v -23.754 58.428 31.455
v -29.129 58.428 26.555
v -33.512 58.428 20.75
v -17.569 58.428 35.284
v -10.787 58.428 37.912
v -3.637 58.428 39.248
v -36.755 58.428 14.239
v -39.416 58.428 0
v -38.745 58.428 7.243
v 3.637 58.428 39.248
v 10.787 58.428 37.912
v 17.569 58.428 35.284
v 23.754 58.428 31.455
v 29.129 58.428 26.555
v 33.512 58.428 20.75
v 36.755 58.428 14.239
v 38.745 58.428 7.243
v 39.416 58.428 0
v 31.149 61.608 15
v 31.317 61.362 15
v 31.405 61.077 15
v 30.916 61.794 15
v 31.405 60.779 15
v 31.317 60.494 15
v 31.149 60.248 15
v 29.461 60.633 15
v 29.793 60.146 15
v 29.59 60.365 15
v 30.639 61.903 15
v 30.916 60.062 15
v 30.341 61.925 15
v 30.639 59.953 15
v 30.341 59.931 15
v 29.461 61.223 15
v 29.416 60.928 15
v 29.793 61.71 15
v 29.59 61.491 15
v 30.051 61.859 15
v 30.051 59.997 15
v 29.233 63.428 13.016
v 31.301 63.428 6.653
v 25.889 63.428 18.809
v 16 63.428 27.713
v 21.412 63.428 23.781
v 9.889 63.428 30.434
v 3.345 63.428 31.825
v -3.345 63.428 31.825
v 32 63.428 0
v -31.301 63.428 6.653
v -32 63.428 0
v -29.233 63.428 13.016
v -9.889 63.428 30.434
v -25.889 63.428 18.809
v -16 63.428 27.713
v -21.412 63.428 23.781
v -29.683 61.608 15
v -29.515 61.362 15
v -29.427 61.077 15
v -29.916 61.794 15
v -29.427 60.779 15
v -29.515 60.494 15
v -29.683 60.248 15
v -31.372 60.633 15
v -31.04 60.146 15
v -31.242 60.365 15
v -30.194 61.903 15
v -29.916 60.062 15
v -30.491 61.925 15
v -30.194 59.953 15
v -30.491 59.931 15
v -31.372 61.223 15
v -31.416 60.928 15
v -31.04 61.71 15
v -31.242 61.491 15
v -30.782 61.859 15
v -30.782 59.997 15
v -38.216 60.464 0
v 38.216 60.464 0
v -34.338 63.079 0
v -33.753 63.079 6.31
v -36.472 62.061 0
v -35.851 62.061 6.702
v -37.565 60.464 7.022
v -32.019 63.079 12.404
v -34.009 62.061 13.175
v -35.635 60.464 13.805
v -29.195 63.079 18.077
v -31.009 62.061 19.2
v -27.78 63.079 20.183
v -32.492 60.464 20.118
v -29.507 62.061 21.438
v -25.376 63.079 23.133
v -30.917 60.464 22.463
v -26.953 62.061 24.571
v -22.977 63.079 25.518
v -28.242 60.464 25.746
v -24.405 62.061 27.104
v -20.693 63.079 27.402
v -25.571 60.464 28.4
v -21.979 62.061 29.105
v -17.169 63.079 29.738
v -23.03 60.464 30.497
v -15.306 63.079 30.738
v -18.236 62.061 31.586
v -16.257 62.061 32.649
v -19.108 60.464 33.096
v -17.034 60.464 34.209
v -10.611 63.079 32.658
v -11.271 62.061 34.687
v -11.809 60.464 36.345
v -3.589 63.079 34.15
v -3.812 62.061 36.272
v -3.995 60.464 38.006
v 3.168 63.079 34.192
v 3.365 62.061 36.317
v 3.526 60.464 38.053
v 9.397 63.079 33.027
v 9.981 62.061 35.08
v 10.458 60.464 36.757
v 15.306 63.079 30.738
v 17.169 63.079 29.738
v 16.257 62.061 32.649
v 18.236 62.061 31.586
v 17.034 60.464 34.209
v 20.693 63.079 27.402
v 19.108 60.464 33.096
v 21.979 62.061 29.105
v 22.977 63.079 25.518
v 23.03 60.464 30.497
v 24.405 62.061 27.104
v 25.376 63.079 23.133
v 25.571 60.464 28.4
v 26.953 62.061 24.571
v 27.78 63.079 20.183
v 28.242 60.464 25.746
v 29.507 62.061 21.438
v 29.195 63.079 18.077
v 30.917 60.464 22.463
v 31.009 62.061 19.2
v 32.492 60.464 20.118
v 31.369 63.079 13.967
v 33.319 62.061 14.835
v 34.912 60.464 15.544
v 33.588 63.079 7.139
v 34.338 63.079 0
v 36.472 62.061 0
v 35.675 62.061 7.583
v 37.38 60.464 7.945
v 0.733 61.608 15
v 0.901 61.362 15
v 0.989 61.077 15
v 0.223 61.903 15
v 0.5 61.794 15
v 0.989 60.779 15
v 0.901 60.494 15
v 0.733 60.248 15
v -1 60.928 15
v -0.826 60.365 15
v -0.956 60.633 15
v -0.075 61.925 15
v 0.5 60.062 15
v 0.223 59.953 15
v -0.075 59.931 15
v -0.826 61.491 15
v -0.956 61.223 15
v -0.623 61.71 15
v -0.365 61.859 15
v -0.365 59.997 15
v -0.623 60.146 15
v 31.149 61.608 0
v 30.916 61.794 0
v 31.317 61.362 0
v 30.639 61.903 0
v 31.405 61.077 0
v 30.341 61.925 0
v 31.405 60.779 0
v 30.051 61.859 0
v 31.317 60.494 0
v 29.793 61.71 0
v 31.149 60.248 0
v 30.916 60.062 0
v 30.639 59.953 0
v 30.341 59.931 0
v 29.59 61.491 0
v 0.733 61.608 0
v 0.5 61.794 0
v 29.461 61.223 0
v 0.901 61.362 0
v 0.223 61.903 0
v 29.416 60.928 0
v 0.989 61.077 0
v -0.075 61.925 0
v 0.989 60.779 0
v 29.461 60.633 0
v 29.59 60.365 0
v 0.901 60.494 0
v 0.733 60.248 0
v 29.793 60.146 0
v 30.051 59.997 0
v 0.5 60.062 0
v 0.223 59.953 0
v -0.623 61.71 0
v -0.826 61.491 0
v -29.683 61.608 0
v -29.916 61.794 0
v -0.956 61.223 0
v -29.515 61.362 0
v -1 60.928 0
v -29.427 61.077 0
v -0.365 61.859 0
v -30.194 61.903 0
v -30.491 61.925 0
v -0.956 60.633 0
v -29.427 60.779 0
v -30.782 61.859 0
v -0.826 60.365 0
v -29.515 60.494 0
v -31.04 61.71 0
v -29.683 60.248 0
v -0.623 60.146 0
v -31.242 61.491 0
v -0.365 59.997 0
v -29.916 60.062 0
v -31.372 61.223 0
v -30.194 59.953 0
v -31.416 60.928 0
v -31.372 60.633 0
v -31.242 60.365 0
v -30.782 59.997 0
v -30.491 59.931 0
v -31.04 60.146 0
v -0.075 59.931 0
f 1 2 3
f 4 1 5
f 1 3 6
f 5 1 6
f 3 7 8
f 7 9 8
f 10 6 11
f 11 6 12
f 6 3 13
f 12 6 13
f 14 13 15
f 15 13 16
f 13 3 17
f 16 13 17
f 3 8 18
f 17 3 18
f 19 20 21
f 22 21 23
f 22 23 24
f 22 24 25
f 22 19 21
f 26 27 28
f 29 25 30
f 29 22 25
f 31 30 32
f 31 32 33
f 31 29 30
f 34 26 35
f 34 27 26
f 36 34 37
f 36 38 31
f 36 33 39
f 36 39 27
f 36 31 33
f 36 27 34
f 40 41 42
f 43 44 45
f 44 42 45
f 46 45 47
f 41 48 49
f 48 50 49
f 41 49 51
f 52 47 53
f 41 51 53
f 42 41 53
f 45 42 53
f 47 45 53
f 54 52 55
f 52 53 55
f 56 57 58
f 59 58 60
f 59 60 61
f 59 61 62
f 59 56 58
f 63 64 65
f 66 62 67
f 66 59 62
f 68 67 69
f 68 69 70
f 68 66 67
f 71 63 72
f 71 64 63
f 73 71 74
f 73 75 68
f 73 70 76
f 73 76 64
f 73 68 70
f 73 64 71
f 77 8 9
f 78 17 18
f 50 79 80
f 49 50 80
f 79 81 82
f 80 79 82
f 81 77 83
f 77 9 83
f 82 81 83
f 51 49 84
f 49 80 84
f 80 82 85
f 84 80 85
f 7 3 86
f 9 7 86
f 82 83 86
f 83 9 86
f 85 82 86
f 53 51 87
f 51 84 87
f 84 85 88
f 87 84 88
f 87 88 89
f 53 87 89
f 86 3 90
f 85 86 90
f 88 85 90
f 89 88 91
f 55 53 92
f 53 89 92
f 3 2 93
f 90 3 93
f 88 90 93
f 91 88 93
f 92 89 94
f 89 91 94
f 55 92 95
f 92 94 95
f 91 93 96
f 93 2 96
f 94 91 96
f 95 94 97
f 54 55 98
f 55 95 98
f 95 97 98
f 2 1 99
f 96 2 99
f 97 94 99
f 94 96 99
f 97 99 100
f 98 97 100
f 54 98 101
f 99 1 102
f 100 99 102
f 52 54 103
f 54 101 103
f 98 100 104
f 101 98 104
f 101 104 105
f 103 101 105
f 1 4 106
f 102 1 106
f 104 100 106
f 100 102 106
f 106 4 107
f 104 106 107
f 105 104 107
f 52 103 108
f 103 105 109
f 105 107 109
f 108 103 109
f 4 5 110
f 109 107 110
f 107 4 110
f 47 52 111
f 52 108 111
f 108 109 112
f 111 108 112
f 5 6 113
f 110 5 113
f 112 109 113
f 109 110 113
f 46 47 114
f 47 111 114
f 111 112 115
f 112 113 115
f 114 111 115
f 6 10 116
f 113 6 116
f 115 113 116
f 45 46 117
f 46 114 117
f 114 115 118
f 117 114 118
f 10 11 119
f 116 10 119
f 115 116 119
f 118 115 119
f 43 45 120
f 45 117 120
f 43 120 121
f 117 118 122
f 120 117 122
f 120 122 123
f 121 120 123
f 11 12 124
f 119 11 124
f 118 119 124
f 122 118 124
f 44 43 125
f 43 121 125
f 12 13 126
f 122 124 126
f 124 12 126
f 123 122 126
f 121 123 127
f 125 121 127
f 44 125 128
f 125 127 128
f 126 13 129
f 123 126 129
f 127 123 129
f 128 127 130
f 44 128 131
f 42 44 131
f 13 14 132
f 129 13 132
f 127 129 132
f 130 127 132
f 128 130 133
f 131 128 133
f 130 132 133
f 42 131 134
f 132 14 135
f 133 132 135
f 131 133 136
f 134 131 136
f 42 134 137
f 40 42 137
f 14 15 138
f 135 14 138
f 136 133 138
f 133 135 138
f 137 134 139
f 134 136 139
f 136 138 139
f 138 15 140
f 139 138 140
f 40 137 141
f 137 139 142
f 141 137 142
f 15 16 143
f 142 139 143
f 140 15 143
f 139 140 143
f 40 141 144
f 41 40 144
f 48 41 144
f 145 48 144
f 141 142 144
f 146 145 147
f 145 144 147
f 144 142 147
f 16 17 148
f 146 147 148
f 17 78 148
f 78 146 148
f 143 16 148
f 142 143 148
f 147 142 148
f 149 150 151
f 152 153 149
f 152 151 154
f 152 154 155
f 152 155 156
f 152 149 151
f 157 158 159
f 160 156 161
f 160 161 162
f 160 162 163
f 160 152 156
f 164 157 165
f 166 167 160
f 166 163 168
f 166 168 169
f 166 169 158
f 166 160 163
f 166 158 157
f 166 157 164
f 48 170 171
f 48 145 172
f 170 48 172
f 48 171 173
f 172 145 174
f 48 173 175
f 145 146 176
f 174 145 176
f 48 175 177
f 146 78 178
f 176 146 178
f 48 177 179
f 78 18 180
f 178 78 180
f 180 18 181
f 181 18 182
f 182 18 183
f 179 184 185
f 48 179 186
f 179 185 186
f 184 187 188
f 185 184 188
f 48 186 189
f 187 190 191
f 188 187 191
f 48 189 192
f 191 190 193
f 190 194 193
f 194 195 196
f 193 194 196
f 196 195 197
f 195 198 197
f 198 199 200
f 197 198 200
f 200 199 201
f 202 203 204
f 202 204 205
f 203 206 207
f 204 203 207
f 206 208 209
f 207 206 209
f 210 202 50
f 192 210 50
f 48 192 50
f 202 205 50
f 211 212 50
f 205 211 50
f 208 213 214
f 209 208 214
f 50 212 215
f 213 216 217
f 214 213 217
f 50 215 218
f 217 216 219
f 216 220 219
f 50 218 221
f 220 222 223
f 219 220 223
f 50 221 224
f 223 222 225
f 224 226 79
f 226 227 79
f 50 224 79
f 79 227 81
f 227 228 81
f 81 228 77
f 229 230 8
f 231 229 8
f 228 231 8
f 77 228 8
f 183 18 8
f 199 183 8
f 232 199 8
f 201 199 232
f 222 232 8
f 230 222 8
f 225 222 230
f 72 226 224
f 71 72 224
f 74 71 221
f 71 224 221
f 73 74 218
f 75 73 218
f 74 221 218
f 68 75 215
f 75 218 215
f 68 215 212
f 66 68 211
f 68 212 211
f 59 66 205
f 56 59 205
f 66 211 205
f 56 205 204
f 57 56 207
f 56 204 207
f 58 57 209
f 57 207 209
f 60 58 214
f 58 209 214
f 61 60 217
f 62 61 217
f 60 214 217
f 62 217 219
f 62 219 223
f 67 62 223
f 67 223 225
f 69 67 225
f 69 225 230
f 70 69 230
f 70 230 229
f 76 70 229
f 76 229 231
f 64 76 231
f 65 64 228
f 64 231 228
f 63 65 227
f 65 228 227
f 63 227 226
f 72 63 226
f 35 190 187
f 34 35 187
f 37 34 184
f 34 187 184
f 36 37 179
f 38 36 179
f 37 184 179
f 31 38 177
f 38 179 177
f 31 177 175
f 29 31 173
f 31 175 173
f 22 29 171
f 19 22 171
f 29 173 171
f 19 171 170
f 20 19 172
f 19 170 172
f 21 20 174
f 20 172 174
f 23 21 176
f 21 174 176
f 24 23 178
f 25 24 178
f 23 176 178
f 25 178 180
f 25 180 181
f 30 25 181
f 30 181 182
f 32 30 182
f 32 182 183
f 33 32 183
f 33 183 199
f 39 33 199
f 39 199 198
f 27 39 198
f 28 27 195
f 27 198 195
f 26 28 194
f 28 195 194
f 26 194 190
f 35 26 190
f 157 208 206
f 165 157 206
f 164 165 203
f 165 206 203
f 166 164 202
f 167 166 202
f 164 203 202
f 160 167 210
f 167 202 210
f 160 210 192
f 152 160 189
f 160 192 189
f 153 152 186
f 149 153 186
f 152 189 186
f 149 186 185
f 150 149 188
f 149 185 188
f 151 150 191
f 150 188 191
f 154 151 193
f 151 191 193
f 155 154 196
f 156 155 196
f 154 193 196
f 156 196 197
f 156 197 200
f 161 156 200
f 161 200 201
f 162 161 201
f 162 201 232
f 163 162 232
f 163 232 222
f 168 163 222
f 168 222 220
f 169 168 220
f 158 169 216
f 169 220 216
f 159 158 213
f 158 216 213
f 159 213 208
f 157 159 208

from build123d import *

# Parameters (mm, degrees)
CUT_EXTRUDE3_DEPTH           = 60
CUT_EXTRUDE5_DEPTH           = 2
CUT_EXTRUDE5_DEPTH_BACK      = 30
SKETCH9_R                    = 38
SKETCH9_R_2                  = 23
SKETCH19_W                   = 12
SKETCH19_H                   = 36.5
CUT_REVOLVE2_ANGLE           = 65
CUT_REVOLVE2_OTHER_WAY_ANGLE = 65
SKETCH21_W                   = 3.25
SKETCH21_H                   = 4
BOSS_EXTRUDE3_DEPTH          = 1.35
CIRPATTERN1_COUNT            = 5
CUT_EXTRUDE9_START           = -5
CUT_EXTRUDE9_DEPTH           = 5
SKETCH23_R                   = 10.5
CUT_EXTRUDE10_DEPTH          = 10
SKETCH24_W                   = 17
SKETCH24_H                   = 12
BOSS_EXTRUDE4_DEPTH          = 8
SKETCH26_W                   = 12
SKETCH26_H                   = 8
CUT_EXTRUDE11_DEPTH          = 10
SKETCH27_W                   = 4
SKETCH27_H                   = 5
CUT_EXTRUDE12_DEPTH          = 5
CUT_EXTRUDE14_DEPTH          = 2
CUT_EXTRUDE14_DEPTH_BACK     = 30
SKETCH29_R                   = 1
CUT_EXTRUDE15_DEPTH          = 15
FILLET1_R                    = 6
FILLET2_R                    = 8
INTERSECT2_DEPTH             = 58.427876097


# Read off the part's stored shape, not the designer's step: Cut-Extrude9, Intersect2
with BuildPart() as part:
    # Sketch1 → Revolve1 (revolve)
    with BuildSketch(Plane.XY, mode=Mode.PRIVATE) as revolve1_sk:
        with BuildLine():
            Line((0, 63.427876097), (32, 63.427876097))
            ThreePointArc((32, 63.427876097), (37.656854249, 61.084730346), (40, 55.427876097))
            Line((40, 55.427876097), (40, 28.846818009))
            ThreePointArc((40, 28.846818009), (38.792081772, 24.082439968), (35.460140376, 20.469057744))
            Line((35.460140376, 20.469057744), (28.539859624, 15.958818353))
            ThreePointArc((28.539859624, 15.958818353), (25.207918228, 12.345436129), (24, 7.581058088))
            Line((24, 7.581058088), (24, 3.25))
            Line((24, 3.25), (24.35, 3))
            Line((24.35, 3), (24.35, 0))
            Line((24.35, 0), (22.5, 0))
            Line((22.5, 0), (22.5, 12.5))
            ThreePointArc((22.5, 12.5), (22.353553391, 12.853553391), (22, 13))
            Line((22, 13), (0, 13))
            Line((0, 13), (0, 63.427876097))
        make_face()
    revolve(revolve1_sk.sketch.rotate(Axis((0, 0, 0), (0, 1, 0)), 90), axis=Axis((0, 0, 0), (0, 1, 0)))

    # Sketch11 → Cut-Extrude3 (cut)
    with BuildSketch(Plane(origin=(0, 13, 0), x_dir=(-1, 0, 0), z_dir=(0, -1, 0))):
        with BuildLine():
            Line((-21, 0), (21, 0))
            ThreePointArc((21, 0), (0, 21), (-21, 0))
        make_face()
    extrude(amount=-CUT_EXTRUDE3_DEPTH, mode=Mode.SUBTRACT)

    # Sketch9 → Cut-Extrude5 (cut, two sides: drawn at the far end of the back side and taken through both)
    with BuildSketch(Plane(origin=(0, 55.427876097, 0), x_dir=(1, 0, 0), z_dir=(0, 1, 0)).offset(-CUT_EXTRUDE5_DEPTH_BACK)):
        with Locations(Location((0, 0, 0), (0, 0, 270))):
            Circle(SKETCH9_R)
        with Locations(Location((0, 0, 0), (0, 0, 270))):
            Circle(SKETCH9_R_2, mode=Mode.SUBTRACT)
    extrude(amount=CUT_EXTRUDE5_DEPTH + CUT_EXTRUDE5_DEPTH_BACK, mode=Mode.SUBTRACT)

    # Sketch19 → Cut-Revolve2 (revolve, cut)
    with BuildSketch(Plane(origin=(0, 0, 0), x_dir=(0, 0, -1), z_dir=(1, 0, 0))):
        with Locations((-41.064715832, 37.177876097)):
            Rectangle(SKETCH19_W, SKETCH19_H)
    revolve(axis=Axis((0, 0, 0), (0, 1, 0)), revolution_arc=CUT_REVOLVE2_ANGLE, mode=Mode.SUBTRACT)

    # Sketch19 → Cut-Revolve2 other way (revolve, cut)
    with BuildSketch(Plane(origin=(0, 0, 0), x_dir=(0, 0, -1), z_dir=(1, 0, 0))):
        with Locations((-41.064715832, 37.177876097)):
            Rectangle(SKETCH19_W, SKETCH19_H)
    revolve(axis=Axis((0, 0, 0), (0, -1, 0)), revolution_arc=CUT_REVOLVE2_OTHER_WAY_ANGLE, mode=Mode.SUBTRACT)

    # Sketch21 → Boss-Extrude3 (add)
    with BuildSketch(Plane(origin=(0, 0, 22.5), x_dir=(-1, 0, 0), z_dir=(0, 0, -1))):
        with Locations((0, 2)):
            Rectangle(SKETCH21_W, SKETCH21_H)
    boss_extrude3 = extrude(amount=BOSS_EXTRUDE3_DEPTH)

    # CirPattern1: Boss-Extrude3 ×5 about axis
    cirpattern1_axis = Axis((0, 0, 0), (0, 1, 0))
    for i in range(1, CIRPATTERN1_COUNT):
        add(boss_extrude3.rotate(cirpattern1_axis, i * 360 / CIRPATTERN1_COUNT))

    # Cut-Extrude9 outline → Cut-Extrude9 (cut)
    with BuildSketch(Plane(origin=(0, 63.427876097, 0), x_dir=(1, 0, 0), z_dir=(0, 1, 0)).offset(CUT_EXTRUDE9_START)):
        with BuildLine():
            ThreePointArc((40, 0), (0, 40), (-40, 0))
            Line((-40, 0), (-21, 0))
            ThreePointArc((-21, 0), (0, 21), (21, 0))
            Line((21, 0), (40, 0))
        make_face()
    extrude(amount=CUT_EXTRUDE9_DEPTH, mode=Mode.SUBTRACT)

    # Sketch23 → Cut-Extrude10 (cut)
    with BuildSketch(Plane(origin=(0, 0, -40), x_dir=(-1, 0, 0), z_dir=(0, 0, -1))):
        with Locations((0, 42.137876097)):
            Circle(SKETCH23_R)
    extrude(amount=-CUT_EXTRUDE10_DEPTH, mode=Mode.SUBTRACT)

    # Sketch24 → Boss-Extrude4 (add)
    with BuildSketch(Plane(origin=(0, 58.427876097, 0), x_dir=(1, 0, 0), z_dir=(0, 1, 0))):
        with Locations((0, 30)):
            Rectangle(SKETCH24_W, SKETCH24_H)
    extrude(amount=-BOSS_EXTRUDE4_DEPTH)

    # Sketch26 → Cut-Extrude11 (cut)
    with BuildSketch(Plane(origin=(0, 58.427876097, 0), x_dir=(1, 0, 0), z_dir=(0, 1, 0))):
        with Locations((0, 30)):
            Rectangle(SKETCH26_W, SKETCH26_H)
    extrude(amount=-CUT_EXTRUDE11_DEPTH, mode=Mode.SUBTRACT)

    # Sketch27 → Cut-Extrude12 (cut)
    with BuildSketch(Plane(origin=(8.5, 0, 0), x_dir=(0, 0, -1), z_dir=(1, 0, 0))):
        with Locations((29.5, 53.927876097)):
            Rectangle(SKETCH27_W, SKETCH27_H)
    extrude(amount=-CUT_EXTRUDE12_DEPTH, mode=Mode.SUBTRACT)

    # Sketch28 → Cut-Extrude14 (cut, two sides: drawn at the far end of the back side and taken through both)
    with BuildSketch(Plane(origin=(0, 55.427876097, 0), x_dir=(1, 0, 0), z_dir=(0, 1, 0)).offset(-CUT_EXTRUDE14_DEPTH_BACK)):
        with BuildLine():
            Line((-22.912878475, -2), (22.912878475, -2))
            ThreePointArc((22.912878475, -2), (0, -23), (-22.912878475, -2))
        make_face()
    extrude(amount=CUT_EXTRUDE14_DEPTH + CUT_EXTRUDE14_DEPTH_BACK, mode=Mode.SUBTRACT)

    # Sketch29 → Cut-Extrude15 (cut)
    with BuildSketch(Plane(origin=(0, 0, 0), x_dir=(-1, 0, 0), z_dir=(0, 0, -1))):
        with Locations((-30.416198487, 60.927876097)):
            Circle(SKETCH29_R)
        with Locations((30.416198487, 60.927876097)):
            Circle(SKETCH29_R)
        with Locations((0, 60.927876097)):
            Circle(SKETCH29_R)
    extrude(amount=-CUT_EXTRUDE15_DEPTH, mode=Mode.SUBTRACT)

    # Fillet1
    fillet1_edges = [part.edges().sort_by_distance(p)[0] for p in [
        (21, 35.713938048, 0),
        (-21, 35.713938048, 0),
    ]]
    fillet(fillet1_edges, radius=FILLET1_R)

    # Fillet2
    fillet2_edges = [part.edges().sort_by_distance(p)[0] for p in [
        (-22.912878475, 41.427876097, 2),
        (22.912878475, 41.427876097, 2),
    ]]
    fillet(fillet2_edges, radius=FILLET2_R)

    # Intersect2 outline → Intersect2 (cut)
    with BuildSketch(Plane(origin=(0, 0, 0), x_dir=(1, 0, 0), z_dir=(0, 1, 0))):
        with BuildLine():
            Line((-37.508702776, -13.895942431), (-42, -15.355253362))
            Line((-42, -15.355253362), (-42, -41))
            Line((-42, -41), (42, -41))
            Line((42, -41), (42, -15.355253362))
            Line((42, -15.355253362), (37.508702776, -13.895942431))
            ThreePointArc((37.508702776, -13.895942431), (0, 40), (-37.508702776, -13.895942431))
        make_face()
        with BuildLine():
            ThreePointArc((19.246817919, 8.4), (18.767687244, 2.713664655), (13.747727085, 0))
            Line((13.747727085, 0), (-13.747727085, 0))
            ThreePointArc((-13.747727085, 0), (-18.767687244, 2.713664655), (-19.246817919, 8.4))
            ThreePointArc((-19.246817919, 8.4), (0, 21), (19.246817919, 8.4))
        make_face(mode=Mode.SUBTRACT)
    extrude(amount=INTERSECT2_DEPTH, mode=Mode.SUBTRACT)


solid = part.part
